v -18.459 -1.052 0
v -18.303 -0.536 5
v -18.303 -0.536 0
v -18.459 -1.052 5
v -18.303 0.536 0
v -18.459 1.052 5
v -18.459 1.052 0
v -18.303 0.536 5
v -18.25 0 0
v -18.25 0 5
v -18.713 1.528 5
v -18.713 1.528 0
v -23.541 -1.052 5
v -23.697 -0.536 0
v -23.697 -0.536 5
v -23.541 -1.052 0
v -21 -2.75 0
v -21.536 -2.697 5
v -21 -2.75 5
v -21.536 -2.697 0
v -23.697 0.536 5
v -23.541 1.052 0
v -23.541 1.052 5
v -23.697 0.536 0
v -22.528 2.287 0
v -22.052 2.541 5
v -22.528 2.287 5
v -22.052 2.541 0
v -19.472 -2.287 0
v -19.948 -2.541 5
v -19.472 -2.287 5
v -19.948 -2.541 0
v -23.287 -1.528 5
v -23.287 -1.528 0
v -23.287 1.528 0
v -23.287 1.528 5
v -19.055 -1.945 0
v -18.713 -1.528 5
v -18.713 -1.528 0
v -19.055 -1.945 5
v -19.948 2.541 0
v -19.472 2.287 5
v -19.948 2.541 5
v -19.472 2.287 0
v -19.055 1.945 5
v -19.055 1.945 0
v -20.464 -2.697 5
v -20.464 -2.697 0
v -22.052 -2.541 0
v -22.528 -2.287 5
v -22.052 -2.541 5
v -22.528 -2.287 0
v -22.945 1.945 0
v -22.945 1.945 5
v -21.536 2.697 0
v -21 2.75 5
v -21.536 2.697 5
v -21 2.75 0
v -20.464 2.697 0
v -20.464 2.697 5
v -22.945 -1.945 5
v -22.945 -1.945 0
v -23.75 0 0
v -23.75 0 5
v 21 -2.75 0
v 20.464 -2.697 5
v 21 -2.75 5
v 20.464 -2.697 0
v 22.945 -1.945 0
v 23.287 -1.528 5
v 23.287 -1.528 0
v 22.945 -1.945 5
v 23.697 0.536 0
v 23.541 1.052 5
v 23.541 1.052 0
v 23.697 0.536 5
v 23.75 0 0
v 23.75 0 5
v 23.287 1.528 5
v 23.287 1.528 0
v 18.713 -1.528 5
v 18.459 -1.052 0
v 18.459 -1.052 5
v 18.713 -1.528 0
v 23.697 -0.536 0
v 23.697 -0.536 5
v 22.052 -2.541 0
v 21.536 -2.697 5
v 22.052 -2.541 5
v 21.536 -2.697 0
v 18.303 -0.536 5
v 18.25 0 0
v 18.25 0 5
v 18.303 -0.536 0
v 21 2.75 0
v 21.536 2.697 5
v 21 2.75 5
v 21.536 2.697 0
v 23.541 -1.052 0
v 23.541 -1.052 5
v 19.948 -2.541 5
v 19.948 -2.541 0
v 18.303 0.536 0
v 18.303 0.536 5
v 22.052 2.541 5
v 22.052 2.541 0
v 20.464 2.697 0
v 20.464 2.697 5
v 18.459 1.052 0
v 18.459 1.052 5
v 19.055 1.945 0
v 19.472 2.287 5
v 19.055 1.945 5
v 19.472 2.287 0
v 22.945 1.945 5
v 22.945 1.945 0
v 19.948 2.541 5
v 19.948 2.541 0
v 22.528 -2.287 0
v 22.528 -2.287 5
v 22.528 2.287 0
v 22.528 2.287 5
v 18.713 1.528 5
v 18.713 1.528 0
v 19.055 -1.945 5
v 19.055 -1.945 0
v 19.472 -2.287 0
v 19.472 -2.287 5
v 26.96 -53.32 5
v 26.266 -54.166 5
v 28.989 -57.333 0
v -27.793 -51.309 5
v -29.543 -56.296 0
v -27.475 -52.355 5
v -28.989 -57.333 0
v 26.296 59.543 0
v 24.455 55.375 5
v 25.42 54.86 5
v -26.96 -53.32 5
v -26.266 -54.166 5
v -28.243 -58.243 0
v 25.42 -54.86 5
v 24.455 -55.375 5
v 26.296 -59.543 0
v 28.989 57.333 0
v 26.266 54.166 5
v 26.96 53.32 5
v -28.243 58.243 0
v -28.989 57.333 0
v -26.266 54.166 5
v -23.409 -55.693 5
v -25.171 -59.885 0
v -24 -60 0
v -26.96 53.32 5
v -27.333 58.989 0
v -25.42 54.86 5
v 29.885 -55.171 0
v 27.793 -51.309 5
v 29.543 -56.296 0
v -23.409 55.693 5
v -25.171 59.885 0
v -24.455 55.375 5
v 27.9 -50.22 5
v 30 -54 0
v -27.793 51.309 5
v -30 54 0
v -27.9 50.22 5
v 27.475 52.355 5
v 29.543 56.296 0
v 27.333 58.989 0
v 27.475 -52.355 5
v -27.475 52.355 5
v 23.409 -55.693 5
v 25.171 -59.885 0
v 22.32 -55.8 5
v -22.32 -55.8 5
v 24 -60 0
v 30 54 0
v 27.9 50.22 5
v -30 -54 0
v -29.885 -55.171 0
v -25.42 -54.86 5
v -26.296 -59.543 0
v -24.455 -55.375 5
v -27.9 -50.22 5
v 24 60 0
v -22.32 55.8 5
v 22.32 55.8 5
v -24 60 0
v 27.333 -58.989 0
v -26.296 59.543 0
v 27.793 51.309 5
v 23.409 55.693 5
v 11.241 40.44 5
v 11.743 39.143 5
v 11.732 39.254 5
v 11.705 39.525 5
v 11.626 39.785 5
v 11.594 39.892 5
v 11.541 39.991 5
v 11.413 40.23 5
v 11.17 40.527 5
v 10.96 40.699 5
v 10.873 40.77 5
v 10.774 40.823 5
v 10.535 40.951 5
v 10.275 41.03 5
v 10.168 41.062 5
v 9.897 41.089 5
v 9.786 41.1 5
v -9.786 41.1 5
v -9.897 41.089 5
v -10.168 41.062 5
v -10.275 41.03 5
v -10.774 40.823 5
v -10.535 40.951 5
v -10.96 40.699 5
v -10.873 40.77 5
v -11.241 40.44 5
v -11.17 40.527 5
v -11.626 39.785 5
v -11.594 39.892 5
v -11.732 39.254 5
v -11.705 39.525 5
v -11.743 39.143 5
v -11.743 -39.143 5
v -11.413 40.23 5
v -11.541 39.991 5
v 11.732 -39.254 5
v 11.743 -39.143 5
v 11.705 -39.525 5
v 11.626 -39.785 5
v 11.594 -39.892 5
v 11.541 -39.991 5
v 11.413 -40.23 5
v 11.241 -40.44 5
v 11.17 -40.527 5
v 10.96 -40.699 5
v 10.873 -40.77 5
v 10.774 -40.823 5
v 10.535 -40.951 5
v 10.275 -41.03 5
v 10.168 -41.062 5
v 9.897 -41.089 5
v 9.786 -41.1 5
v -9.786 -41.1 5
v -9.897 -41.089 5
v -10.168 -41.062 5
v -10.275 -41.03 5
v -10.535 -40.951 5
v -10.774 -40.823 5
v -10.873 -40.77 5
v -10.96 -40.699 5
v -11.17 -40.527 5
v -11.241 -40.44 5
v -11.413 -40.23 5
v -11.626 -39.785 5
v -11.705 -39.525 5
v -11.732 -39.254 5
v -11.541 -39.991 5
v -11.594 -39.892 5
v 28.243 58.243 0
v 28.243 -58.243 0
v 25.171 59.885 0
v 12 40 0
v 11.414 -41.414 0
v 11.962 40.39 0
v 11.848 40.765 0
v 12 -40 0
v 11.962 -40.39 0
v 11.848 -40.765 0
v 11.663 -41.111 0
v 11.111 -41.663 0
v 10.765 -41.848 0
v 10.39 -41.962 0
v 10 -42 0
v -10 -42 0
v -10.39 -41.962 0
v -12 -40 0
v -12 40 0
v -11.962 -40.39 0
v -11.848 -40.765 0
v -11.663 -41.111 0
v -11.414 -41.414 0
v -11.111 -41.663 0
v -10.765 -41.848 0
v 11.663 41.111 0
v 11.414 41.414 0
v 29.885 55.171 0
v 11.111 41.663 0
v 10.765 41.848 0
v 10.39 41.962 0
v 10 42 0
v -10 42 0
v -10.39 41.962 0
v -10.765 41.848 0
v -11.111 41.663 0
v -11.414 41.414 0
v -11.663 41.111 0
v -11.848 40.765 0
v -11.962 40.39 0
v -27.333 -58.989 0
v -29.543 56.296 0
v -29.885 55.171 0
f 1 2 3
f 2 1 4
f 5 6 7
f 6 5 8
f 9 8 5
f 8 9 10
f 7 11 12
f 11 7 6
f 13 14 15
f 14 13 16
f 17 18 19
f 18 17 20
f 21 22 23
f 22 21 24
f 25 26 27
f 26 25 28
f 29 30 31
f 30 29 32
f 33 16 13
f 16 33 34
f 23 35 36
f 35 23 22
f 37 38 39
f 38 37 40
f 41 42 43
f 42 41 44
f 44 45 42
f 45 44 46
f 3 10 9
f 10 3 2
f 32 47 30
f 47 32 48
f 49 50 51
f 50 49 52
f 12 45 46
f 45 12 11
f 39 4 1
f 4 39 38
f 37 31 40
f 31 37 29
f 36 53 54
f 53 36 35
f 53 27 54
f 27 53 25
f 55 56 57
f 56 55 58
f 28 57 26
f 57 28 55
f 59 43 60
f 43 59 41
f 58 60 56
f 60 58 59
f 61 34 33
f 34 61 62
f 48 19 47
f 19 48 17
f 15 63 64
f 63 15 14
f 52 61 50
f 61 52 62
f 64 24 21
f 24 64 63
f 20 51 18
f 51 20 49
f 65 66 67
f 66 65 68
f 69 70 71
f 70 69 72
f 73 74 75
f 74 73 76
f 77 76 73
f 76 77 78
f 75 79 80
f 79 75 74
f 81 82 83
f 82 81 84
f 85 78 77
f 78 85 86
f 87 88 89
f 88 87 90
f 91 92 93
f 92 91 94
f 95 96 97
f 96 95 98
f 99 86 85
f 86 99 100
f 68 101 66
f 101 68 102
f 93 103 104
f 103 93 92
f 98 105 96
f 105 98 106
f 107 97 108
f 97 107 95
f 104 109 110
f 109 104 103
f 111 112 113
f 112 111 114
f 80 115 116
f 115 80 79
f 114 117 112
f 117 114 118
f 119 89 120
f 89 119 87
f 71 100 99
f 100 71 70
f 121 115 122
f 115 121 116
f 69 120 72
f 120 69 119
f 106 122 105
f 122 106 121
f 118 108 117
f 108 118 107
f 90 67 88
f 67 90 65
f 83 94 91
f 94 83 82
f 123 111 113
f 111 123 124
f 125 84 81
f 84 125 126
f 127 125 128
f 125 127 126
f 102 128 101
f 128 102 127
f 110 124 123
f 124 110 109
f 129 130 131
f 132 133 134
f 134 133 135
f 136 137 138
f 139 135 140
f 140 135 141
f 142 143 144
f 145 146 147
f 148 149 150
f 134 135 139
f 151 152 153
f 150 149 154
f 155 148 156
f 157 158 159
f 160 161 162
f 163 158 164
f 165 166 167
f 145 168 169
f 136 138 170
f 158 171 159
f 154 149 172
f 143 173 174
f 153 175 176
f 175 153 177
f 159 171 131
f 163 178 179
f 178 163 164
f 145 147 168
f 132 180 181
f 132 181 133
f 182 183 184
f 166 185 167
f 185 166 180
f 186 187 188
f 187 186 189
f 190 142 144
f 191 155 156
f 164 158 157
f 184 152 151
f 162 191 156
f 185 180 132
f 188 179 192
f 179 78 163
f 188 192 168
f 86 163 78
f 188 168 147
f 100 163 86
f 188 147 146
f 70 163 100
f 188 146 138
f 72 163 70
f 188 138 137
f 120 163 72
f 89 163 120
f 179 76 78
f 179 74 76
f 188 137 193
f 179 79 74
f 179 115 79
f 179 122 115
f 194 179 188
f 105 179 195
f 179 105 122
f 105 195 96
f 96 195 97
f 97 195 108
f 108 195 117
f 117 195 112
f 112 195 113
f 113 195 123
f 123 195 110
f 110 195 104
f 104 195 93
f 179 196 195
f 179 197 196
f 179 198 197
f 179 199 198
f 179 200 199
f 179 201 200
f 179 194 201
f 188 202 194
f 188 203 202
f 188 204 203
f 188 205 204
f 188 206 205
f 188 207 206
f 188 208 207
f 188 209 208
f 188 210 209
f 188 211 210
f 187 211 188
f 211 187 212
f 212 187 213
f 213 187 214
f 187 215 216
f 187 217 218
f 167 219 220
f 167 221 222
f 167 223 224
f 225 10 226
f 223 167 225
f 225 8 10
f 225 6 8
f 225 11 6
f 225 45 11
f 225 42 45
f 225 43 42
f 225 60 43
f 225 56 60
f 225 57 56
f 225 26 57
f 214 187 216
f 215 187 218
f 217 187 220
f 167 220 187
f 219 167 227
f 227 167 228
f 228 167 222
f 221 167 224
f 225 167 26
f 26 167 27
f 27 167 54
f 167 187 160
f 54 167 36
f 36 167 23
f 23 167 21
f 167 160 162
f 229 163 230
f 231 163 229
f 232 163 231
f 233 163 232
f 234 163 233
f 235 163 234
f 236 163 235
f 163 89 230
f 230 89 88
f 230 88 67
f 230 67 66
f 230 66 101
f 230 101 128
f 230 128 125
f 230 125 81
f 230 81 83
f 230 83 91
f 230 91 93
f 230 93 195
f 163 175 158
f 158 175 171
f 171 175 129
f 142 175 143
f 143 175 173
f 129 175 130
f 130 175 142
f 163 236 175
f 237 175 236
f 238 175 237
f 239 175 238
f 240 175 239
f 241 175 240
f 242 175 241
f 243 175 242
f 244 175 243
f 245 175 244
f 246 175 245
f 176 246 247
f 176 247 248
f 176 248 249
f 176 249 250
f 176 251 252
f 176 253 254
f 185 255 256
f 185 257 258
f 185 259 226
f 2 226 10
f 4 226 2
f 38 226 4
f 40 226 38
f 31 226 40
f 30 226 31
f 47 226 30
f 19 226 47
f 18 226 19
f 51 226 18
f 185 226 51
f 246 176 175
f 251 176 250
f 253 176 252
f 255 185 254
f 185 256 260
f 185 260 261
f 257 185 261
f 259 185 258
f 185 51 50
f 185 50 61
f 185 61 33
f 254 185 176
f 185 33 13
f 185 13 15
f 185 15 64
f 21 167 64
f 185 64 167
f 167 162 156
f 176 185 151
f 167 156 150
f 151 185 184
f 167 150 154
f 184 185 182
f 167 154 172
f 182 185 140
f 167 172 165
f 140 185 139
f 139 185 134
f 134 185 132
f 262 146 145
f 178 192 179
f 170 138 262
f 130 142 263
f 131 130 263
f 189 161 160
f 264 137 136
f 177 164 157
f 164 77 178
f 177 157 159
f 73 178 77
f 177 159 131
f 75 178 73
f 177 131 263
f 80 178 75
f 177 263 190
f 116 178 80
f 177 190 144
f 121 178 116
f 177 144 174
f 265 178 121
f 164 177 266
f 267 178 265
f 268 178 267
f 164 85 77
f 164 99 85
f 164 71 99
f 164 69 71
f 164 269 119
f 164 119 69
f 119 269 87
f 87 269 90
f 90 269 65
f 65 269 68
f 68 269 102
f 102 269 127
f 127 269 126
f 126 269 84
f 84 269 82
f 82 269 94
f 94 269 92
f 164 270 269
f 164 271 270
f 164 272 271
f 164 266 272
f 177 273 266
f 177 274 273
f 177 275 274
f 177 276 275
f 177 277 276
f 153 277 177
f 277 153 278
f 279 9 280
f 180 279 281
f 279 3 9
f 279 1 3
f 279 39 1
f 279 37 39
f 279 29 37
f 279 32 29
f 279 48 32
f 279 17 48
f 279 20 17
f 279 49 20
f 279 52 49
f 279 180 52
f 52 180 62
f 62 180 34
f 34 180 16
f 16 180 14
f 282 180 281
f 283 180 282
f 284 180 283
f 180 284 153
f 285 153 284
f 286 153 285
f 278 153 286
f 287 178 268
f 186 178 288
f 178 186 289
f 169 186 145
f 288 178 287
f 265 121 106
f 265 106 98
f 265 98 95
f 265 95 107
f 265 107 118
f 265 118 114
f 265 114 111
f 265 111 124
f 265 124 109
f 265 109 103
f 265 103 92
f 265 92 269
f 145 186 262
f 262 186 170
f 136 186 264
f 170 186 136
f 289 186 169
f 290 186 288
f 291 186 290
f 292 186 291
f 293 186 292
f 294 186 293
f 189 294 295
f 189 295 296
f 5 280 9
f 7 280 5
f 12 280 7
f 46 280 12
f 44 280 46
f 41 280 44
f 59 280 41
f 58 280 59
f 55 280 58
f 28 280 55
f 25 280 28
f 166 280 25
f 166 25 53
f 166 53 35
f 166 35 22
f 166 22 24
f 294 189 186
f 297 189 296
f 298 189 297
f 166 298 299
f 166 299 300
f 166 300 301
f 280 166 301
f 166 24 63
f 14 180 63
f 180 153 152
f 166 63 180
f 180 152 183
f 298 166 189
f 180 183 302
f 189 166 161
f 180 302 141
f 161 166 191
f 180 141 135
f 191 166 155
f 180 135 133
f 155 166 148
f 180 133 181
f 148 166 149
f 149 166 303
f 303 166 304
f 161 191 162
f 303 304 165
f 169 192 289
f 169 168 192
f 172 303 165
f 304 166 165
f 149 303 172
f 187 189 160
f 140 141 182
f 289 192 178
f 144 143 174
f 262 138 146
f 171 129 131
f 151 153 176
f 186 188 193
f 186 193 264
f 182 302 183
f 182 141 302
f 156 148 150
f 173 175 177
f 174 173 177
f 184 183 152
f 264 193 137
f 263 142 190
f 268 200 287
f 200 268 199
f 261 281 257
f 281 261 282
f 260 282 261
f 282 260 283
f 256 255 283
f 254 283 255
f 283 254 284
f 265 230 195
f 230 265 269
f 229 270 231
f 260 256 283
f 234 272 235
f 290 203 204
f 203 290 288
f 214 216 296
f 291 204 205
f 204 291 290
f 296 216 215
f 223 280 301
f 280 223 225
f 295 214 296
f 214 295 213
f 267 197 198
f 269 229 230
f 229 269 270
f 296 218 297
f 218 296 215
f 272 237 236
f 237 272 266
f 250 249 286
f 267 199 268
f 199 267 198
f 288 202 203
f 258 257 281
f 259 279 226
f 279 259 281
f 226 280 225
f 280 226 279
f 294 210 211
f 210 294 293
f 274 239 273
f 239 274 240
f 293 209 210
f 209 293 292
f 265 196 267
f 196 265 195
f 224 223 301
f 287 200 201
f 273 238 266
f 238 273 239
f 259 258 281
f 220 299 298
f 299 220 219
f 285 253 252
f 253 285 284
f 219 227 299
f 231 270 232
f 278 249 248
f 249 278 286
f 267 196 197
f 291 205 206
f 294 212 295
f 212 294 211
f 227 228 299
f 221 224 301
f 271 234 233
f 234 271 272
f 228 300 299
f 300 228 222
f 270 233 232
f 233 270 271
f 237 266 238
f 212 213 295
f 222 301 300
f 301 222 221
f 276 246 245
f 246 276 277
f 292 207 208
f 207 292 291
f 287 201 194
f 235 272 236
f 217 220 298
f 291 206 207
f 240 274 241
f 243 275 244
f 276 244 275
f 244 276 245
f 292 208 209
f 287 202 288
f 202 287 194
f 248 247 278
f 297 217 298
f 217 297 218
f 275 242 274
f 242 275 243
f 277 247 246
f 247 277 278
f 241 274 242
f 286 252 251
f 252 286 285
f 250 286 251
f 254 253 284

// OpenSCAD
$fn = 32;

// ----------------------------------------------------------------------
// Display bezel: 60 x 120 mm frame, opening 24x84 mm
// ----------------------------------------------------------------------

// --- parameters (mm) ---
length = 60;              // frame outside length, X
width = 120;              // frame outside width, Y
frame_w = 18;             // frame width
thickness = 5;            // frame thickness
corner_r = 6;             // outside corner radius
chamfer = 0.93;           // outer wall taper
funnel = 0.97;            // inner opening taper
opening_l = 24;           // opening length
opening_w = 84;           // opening width
inner_r = 2;              // opening corner radius
hole_d = 5.5;             // mounting screw clearance
holes_per_side = 1;       // holes per short side
hole_inset = 9;           // hole centre inset from the outside edge

/* rounded-rectangle outlines, generated with loops */
module rounded_ring(l_nom, w_nom, r) {
  hull() {
    for (sx = [-1, 1]) for (sy = [-1, 1])
      translate([sx * (l_nom / 2 - r), sy * (w_nom / 2 - r)]) circle(r = r);
  }
}

difference() {
  /* frame body, drafted so the outer edge is a variable-depth chamfer */
  linear_extrude(height = thickness, scale = chamfer)
    rounded_ring(length, width, corner_r);
  /* viewing opening, drafted the other way for a funnel edge */
  linear_extrude(height = thickness + 2, scale = funnel)
    translate([0, 0, -1]) rounded_ring(opening_l, opening_w, inner_r);
  /* mounting screws through the frame lands */
  for (sx = [-1, 1]) for (i = [1 : holes_per_side])
    translate([sx * (length / 2 - hole_inset),
               (i - (holes_per_side + 1) / 2) * width * 0.5, -1])
      cylinder(h = thickness + 2, d = hole_d);
}
